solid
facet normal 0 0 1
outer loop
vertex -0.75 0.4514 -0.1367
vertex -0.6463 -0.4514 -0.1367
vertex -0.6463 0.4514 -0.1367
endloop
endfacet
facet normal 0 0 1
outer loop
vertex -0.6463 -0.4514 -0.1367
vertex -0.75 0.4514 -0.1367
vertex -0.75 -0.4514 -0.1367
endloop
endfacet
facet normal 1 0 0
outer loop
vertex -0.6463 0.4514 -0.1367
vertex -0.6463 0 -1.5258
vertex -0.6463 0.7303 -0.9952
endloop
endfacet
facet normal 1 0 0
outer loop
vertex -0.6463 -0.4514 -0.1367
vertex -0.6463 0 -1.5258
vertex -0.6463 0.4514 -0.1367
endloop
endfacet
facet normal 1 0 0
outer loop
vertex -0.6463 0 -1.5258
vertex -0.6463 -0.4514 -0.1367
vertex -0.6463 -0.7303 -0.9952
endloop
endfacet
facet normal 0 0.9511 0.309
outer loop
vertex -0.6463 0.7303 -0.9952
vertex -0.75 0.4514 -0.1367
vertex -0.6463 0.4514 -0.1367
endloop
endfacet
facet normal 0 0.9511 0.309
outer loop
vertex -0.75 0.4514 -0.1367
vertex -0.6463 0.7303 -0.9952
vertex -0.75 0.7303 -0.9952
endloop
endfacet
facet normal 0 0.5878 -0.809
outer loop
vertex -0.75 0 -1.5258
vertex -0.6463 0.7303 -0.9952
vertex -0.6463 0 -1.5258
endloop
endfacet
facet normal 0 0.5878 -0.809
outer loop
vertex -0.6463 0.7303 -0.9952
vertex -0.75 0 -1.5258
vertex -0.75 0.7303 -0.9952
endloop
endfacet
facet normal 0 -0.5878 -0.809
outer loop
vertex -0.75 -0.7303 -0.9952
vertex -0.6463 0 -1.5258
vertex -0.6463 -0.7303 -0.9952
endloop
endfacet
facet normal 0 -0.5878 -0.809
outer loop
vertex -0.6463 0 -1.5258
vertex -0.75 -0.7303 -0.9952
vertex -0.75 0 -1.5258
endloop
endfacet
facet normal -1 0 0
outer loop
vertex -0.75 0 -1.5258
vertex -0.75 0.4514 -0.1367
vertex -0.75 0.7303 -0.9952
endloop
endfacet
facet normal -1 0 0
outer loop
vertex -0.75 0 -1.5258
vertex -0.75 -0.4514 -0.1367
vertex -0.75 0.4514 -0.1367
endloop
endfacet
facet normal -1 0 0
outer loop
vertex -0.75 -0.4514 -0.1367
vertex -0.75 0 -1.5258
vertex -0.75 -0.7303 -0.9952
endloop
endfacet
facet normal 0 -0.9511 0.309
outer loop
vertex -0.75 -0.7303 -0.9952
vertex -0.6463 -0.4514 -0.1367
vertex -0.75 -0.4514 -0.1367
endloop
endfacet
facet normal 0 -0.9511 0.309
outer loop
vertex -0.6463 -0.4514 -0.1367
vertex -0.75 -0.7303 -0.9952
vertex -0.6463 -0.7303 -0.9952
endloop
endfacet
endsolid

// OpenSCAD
EPS = 0.01;

translate([-0.75, 0, 0])
rotate([0, 90, 0])
difference() {
    linear_extrude(height=0.09375 + EPS)
    translate([0.7578947368421053, 0])
    circle(r=0.7578947368421053 + EPS);

    translate([0.7578947368421053, 0])
    circle(r=0.4736842105263158);
}
